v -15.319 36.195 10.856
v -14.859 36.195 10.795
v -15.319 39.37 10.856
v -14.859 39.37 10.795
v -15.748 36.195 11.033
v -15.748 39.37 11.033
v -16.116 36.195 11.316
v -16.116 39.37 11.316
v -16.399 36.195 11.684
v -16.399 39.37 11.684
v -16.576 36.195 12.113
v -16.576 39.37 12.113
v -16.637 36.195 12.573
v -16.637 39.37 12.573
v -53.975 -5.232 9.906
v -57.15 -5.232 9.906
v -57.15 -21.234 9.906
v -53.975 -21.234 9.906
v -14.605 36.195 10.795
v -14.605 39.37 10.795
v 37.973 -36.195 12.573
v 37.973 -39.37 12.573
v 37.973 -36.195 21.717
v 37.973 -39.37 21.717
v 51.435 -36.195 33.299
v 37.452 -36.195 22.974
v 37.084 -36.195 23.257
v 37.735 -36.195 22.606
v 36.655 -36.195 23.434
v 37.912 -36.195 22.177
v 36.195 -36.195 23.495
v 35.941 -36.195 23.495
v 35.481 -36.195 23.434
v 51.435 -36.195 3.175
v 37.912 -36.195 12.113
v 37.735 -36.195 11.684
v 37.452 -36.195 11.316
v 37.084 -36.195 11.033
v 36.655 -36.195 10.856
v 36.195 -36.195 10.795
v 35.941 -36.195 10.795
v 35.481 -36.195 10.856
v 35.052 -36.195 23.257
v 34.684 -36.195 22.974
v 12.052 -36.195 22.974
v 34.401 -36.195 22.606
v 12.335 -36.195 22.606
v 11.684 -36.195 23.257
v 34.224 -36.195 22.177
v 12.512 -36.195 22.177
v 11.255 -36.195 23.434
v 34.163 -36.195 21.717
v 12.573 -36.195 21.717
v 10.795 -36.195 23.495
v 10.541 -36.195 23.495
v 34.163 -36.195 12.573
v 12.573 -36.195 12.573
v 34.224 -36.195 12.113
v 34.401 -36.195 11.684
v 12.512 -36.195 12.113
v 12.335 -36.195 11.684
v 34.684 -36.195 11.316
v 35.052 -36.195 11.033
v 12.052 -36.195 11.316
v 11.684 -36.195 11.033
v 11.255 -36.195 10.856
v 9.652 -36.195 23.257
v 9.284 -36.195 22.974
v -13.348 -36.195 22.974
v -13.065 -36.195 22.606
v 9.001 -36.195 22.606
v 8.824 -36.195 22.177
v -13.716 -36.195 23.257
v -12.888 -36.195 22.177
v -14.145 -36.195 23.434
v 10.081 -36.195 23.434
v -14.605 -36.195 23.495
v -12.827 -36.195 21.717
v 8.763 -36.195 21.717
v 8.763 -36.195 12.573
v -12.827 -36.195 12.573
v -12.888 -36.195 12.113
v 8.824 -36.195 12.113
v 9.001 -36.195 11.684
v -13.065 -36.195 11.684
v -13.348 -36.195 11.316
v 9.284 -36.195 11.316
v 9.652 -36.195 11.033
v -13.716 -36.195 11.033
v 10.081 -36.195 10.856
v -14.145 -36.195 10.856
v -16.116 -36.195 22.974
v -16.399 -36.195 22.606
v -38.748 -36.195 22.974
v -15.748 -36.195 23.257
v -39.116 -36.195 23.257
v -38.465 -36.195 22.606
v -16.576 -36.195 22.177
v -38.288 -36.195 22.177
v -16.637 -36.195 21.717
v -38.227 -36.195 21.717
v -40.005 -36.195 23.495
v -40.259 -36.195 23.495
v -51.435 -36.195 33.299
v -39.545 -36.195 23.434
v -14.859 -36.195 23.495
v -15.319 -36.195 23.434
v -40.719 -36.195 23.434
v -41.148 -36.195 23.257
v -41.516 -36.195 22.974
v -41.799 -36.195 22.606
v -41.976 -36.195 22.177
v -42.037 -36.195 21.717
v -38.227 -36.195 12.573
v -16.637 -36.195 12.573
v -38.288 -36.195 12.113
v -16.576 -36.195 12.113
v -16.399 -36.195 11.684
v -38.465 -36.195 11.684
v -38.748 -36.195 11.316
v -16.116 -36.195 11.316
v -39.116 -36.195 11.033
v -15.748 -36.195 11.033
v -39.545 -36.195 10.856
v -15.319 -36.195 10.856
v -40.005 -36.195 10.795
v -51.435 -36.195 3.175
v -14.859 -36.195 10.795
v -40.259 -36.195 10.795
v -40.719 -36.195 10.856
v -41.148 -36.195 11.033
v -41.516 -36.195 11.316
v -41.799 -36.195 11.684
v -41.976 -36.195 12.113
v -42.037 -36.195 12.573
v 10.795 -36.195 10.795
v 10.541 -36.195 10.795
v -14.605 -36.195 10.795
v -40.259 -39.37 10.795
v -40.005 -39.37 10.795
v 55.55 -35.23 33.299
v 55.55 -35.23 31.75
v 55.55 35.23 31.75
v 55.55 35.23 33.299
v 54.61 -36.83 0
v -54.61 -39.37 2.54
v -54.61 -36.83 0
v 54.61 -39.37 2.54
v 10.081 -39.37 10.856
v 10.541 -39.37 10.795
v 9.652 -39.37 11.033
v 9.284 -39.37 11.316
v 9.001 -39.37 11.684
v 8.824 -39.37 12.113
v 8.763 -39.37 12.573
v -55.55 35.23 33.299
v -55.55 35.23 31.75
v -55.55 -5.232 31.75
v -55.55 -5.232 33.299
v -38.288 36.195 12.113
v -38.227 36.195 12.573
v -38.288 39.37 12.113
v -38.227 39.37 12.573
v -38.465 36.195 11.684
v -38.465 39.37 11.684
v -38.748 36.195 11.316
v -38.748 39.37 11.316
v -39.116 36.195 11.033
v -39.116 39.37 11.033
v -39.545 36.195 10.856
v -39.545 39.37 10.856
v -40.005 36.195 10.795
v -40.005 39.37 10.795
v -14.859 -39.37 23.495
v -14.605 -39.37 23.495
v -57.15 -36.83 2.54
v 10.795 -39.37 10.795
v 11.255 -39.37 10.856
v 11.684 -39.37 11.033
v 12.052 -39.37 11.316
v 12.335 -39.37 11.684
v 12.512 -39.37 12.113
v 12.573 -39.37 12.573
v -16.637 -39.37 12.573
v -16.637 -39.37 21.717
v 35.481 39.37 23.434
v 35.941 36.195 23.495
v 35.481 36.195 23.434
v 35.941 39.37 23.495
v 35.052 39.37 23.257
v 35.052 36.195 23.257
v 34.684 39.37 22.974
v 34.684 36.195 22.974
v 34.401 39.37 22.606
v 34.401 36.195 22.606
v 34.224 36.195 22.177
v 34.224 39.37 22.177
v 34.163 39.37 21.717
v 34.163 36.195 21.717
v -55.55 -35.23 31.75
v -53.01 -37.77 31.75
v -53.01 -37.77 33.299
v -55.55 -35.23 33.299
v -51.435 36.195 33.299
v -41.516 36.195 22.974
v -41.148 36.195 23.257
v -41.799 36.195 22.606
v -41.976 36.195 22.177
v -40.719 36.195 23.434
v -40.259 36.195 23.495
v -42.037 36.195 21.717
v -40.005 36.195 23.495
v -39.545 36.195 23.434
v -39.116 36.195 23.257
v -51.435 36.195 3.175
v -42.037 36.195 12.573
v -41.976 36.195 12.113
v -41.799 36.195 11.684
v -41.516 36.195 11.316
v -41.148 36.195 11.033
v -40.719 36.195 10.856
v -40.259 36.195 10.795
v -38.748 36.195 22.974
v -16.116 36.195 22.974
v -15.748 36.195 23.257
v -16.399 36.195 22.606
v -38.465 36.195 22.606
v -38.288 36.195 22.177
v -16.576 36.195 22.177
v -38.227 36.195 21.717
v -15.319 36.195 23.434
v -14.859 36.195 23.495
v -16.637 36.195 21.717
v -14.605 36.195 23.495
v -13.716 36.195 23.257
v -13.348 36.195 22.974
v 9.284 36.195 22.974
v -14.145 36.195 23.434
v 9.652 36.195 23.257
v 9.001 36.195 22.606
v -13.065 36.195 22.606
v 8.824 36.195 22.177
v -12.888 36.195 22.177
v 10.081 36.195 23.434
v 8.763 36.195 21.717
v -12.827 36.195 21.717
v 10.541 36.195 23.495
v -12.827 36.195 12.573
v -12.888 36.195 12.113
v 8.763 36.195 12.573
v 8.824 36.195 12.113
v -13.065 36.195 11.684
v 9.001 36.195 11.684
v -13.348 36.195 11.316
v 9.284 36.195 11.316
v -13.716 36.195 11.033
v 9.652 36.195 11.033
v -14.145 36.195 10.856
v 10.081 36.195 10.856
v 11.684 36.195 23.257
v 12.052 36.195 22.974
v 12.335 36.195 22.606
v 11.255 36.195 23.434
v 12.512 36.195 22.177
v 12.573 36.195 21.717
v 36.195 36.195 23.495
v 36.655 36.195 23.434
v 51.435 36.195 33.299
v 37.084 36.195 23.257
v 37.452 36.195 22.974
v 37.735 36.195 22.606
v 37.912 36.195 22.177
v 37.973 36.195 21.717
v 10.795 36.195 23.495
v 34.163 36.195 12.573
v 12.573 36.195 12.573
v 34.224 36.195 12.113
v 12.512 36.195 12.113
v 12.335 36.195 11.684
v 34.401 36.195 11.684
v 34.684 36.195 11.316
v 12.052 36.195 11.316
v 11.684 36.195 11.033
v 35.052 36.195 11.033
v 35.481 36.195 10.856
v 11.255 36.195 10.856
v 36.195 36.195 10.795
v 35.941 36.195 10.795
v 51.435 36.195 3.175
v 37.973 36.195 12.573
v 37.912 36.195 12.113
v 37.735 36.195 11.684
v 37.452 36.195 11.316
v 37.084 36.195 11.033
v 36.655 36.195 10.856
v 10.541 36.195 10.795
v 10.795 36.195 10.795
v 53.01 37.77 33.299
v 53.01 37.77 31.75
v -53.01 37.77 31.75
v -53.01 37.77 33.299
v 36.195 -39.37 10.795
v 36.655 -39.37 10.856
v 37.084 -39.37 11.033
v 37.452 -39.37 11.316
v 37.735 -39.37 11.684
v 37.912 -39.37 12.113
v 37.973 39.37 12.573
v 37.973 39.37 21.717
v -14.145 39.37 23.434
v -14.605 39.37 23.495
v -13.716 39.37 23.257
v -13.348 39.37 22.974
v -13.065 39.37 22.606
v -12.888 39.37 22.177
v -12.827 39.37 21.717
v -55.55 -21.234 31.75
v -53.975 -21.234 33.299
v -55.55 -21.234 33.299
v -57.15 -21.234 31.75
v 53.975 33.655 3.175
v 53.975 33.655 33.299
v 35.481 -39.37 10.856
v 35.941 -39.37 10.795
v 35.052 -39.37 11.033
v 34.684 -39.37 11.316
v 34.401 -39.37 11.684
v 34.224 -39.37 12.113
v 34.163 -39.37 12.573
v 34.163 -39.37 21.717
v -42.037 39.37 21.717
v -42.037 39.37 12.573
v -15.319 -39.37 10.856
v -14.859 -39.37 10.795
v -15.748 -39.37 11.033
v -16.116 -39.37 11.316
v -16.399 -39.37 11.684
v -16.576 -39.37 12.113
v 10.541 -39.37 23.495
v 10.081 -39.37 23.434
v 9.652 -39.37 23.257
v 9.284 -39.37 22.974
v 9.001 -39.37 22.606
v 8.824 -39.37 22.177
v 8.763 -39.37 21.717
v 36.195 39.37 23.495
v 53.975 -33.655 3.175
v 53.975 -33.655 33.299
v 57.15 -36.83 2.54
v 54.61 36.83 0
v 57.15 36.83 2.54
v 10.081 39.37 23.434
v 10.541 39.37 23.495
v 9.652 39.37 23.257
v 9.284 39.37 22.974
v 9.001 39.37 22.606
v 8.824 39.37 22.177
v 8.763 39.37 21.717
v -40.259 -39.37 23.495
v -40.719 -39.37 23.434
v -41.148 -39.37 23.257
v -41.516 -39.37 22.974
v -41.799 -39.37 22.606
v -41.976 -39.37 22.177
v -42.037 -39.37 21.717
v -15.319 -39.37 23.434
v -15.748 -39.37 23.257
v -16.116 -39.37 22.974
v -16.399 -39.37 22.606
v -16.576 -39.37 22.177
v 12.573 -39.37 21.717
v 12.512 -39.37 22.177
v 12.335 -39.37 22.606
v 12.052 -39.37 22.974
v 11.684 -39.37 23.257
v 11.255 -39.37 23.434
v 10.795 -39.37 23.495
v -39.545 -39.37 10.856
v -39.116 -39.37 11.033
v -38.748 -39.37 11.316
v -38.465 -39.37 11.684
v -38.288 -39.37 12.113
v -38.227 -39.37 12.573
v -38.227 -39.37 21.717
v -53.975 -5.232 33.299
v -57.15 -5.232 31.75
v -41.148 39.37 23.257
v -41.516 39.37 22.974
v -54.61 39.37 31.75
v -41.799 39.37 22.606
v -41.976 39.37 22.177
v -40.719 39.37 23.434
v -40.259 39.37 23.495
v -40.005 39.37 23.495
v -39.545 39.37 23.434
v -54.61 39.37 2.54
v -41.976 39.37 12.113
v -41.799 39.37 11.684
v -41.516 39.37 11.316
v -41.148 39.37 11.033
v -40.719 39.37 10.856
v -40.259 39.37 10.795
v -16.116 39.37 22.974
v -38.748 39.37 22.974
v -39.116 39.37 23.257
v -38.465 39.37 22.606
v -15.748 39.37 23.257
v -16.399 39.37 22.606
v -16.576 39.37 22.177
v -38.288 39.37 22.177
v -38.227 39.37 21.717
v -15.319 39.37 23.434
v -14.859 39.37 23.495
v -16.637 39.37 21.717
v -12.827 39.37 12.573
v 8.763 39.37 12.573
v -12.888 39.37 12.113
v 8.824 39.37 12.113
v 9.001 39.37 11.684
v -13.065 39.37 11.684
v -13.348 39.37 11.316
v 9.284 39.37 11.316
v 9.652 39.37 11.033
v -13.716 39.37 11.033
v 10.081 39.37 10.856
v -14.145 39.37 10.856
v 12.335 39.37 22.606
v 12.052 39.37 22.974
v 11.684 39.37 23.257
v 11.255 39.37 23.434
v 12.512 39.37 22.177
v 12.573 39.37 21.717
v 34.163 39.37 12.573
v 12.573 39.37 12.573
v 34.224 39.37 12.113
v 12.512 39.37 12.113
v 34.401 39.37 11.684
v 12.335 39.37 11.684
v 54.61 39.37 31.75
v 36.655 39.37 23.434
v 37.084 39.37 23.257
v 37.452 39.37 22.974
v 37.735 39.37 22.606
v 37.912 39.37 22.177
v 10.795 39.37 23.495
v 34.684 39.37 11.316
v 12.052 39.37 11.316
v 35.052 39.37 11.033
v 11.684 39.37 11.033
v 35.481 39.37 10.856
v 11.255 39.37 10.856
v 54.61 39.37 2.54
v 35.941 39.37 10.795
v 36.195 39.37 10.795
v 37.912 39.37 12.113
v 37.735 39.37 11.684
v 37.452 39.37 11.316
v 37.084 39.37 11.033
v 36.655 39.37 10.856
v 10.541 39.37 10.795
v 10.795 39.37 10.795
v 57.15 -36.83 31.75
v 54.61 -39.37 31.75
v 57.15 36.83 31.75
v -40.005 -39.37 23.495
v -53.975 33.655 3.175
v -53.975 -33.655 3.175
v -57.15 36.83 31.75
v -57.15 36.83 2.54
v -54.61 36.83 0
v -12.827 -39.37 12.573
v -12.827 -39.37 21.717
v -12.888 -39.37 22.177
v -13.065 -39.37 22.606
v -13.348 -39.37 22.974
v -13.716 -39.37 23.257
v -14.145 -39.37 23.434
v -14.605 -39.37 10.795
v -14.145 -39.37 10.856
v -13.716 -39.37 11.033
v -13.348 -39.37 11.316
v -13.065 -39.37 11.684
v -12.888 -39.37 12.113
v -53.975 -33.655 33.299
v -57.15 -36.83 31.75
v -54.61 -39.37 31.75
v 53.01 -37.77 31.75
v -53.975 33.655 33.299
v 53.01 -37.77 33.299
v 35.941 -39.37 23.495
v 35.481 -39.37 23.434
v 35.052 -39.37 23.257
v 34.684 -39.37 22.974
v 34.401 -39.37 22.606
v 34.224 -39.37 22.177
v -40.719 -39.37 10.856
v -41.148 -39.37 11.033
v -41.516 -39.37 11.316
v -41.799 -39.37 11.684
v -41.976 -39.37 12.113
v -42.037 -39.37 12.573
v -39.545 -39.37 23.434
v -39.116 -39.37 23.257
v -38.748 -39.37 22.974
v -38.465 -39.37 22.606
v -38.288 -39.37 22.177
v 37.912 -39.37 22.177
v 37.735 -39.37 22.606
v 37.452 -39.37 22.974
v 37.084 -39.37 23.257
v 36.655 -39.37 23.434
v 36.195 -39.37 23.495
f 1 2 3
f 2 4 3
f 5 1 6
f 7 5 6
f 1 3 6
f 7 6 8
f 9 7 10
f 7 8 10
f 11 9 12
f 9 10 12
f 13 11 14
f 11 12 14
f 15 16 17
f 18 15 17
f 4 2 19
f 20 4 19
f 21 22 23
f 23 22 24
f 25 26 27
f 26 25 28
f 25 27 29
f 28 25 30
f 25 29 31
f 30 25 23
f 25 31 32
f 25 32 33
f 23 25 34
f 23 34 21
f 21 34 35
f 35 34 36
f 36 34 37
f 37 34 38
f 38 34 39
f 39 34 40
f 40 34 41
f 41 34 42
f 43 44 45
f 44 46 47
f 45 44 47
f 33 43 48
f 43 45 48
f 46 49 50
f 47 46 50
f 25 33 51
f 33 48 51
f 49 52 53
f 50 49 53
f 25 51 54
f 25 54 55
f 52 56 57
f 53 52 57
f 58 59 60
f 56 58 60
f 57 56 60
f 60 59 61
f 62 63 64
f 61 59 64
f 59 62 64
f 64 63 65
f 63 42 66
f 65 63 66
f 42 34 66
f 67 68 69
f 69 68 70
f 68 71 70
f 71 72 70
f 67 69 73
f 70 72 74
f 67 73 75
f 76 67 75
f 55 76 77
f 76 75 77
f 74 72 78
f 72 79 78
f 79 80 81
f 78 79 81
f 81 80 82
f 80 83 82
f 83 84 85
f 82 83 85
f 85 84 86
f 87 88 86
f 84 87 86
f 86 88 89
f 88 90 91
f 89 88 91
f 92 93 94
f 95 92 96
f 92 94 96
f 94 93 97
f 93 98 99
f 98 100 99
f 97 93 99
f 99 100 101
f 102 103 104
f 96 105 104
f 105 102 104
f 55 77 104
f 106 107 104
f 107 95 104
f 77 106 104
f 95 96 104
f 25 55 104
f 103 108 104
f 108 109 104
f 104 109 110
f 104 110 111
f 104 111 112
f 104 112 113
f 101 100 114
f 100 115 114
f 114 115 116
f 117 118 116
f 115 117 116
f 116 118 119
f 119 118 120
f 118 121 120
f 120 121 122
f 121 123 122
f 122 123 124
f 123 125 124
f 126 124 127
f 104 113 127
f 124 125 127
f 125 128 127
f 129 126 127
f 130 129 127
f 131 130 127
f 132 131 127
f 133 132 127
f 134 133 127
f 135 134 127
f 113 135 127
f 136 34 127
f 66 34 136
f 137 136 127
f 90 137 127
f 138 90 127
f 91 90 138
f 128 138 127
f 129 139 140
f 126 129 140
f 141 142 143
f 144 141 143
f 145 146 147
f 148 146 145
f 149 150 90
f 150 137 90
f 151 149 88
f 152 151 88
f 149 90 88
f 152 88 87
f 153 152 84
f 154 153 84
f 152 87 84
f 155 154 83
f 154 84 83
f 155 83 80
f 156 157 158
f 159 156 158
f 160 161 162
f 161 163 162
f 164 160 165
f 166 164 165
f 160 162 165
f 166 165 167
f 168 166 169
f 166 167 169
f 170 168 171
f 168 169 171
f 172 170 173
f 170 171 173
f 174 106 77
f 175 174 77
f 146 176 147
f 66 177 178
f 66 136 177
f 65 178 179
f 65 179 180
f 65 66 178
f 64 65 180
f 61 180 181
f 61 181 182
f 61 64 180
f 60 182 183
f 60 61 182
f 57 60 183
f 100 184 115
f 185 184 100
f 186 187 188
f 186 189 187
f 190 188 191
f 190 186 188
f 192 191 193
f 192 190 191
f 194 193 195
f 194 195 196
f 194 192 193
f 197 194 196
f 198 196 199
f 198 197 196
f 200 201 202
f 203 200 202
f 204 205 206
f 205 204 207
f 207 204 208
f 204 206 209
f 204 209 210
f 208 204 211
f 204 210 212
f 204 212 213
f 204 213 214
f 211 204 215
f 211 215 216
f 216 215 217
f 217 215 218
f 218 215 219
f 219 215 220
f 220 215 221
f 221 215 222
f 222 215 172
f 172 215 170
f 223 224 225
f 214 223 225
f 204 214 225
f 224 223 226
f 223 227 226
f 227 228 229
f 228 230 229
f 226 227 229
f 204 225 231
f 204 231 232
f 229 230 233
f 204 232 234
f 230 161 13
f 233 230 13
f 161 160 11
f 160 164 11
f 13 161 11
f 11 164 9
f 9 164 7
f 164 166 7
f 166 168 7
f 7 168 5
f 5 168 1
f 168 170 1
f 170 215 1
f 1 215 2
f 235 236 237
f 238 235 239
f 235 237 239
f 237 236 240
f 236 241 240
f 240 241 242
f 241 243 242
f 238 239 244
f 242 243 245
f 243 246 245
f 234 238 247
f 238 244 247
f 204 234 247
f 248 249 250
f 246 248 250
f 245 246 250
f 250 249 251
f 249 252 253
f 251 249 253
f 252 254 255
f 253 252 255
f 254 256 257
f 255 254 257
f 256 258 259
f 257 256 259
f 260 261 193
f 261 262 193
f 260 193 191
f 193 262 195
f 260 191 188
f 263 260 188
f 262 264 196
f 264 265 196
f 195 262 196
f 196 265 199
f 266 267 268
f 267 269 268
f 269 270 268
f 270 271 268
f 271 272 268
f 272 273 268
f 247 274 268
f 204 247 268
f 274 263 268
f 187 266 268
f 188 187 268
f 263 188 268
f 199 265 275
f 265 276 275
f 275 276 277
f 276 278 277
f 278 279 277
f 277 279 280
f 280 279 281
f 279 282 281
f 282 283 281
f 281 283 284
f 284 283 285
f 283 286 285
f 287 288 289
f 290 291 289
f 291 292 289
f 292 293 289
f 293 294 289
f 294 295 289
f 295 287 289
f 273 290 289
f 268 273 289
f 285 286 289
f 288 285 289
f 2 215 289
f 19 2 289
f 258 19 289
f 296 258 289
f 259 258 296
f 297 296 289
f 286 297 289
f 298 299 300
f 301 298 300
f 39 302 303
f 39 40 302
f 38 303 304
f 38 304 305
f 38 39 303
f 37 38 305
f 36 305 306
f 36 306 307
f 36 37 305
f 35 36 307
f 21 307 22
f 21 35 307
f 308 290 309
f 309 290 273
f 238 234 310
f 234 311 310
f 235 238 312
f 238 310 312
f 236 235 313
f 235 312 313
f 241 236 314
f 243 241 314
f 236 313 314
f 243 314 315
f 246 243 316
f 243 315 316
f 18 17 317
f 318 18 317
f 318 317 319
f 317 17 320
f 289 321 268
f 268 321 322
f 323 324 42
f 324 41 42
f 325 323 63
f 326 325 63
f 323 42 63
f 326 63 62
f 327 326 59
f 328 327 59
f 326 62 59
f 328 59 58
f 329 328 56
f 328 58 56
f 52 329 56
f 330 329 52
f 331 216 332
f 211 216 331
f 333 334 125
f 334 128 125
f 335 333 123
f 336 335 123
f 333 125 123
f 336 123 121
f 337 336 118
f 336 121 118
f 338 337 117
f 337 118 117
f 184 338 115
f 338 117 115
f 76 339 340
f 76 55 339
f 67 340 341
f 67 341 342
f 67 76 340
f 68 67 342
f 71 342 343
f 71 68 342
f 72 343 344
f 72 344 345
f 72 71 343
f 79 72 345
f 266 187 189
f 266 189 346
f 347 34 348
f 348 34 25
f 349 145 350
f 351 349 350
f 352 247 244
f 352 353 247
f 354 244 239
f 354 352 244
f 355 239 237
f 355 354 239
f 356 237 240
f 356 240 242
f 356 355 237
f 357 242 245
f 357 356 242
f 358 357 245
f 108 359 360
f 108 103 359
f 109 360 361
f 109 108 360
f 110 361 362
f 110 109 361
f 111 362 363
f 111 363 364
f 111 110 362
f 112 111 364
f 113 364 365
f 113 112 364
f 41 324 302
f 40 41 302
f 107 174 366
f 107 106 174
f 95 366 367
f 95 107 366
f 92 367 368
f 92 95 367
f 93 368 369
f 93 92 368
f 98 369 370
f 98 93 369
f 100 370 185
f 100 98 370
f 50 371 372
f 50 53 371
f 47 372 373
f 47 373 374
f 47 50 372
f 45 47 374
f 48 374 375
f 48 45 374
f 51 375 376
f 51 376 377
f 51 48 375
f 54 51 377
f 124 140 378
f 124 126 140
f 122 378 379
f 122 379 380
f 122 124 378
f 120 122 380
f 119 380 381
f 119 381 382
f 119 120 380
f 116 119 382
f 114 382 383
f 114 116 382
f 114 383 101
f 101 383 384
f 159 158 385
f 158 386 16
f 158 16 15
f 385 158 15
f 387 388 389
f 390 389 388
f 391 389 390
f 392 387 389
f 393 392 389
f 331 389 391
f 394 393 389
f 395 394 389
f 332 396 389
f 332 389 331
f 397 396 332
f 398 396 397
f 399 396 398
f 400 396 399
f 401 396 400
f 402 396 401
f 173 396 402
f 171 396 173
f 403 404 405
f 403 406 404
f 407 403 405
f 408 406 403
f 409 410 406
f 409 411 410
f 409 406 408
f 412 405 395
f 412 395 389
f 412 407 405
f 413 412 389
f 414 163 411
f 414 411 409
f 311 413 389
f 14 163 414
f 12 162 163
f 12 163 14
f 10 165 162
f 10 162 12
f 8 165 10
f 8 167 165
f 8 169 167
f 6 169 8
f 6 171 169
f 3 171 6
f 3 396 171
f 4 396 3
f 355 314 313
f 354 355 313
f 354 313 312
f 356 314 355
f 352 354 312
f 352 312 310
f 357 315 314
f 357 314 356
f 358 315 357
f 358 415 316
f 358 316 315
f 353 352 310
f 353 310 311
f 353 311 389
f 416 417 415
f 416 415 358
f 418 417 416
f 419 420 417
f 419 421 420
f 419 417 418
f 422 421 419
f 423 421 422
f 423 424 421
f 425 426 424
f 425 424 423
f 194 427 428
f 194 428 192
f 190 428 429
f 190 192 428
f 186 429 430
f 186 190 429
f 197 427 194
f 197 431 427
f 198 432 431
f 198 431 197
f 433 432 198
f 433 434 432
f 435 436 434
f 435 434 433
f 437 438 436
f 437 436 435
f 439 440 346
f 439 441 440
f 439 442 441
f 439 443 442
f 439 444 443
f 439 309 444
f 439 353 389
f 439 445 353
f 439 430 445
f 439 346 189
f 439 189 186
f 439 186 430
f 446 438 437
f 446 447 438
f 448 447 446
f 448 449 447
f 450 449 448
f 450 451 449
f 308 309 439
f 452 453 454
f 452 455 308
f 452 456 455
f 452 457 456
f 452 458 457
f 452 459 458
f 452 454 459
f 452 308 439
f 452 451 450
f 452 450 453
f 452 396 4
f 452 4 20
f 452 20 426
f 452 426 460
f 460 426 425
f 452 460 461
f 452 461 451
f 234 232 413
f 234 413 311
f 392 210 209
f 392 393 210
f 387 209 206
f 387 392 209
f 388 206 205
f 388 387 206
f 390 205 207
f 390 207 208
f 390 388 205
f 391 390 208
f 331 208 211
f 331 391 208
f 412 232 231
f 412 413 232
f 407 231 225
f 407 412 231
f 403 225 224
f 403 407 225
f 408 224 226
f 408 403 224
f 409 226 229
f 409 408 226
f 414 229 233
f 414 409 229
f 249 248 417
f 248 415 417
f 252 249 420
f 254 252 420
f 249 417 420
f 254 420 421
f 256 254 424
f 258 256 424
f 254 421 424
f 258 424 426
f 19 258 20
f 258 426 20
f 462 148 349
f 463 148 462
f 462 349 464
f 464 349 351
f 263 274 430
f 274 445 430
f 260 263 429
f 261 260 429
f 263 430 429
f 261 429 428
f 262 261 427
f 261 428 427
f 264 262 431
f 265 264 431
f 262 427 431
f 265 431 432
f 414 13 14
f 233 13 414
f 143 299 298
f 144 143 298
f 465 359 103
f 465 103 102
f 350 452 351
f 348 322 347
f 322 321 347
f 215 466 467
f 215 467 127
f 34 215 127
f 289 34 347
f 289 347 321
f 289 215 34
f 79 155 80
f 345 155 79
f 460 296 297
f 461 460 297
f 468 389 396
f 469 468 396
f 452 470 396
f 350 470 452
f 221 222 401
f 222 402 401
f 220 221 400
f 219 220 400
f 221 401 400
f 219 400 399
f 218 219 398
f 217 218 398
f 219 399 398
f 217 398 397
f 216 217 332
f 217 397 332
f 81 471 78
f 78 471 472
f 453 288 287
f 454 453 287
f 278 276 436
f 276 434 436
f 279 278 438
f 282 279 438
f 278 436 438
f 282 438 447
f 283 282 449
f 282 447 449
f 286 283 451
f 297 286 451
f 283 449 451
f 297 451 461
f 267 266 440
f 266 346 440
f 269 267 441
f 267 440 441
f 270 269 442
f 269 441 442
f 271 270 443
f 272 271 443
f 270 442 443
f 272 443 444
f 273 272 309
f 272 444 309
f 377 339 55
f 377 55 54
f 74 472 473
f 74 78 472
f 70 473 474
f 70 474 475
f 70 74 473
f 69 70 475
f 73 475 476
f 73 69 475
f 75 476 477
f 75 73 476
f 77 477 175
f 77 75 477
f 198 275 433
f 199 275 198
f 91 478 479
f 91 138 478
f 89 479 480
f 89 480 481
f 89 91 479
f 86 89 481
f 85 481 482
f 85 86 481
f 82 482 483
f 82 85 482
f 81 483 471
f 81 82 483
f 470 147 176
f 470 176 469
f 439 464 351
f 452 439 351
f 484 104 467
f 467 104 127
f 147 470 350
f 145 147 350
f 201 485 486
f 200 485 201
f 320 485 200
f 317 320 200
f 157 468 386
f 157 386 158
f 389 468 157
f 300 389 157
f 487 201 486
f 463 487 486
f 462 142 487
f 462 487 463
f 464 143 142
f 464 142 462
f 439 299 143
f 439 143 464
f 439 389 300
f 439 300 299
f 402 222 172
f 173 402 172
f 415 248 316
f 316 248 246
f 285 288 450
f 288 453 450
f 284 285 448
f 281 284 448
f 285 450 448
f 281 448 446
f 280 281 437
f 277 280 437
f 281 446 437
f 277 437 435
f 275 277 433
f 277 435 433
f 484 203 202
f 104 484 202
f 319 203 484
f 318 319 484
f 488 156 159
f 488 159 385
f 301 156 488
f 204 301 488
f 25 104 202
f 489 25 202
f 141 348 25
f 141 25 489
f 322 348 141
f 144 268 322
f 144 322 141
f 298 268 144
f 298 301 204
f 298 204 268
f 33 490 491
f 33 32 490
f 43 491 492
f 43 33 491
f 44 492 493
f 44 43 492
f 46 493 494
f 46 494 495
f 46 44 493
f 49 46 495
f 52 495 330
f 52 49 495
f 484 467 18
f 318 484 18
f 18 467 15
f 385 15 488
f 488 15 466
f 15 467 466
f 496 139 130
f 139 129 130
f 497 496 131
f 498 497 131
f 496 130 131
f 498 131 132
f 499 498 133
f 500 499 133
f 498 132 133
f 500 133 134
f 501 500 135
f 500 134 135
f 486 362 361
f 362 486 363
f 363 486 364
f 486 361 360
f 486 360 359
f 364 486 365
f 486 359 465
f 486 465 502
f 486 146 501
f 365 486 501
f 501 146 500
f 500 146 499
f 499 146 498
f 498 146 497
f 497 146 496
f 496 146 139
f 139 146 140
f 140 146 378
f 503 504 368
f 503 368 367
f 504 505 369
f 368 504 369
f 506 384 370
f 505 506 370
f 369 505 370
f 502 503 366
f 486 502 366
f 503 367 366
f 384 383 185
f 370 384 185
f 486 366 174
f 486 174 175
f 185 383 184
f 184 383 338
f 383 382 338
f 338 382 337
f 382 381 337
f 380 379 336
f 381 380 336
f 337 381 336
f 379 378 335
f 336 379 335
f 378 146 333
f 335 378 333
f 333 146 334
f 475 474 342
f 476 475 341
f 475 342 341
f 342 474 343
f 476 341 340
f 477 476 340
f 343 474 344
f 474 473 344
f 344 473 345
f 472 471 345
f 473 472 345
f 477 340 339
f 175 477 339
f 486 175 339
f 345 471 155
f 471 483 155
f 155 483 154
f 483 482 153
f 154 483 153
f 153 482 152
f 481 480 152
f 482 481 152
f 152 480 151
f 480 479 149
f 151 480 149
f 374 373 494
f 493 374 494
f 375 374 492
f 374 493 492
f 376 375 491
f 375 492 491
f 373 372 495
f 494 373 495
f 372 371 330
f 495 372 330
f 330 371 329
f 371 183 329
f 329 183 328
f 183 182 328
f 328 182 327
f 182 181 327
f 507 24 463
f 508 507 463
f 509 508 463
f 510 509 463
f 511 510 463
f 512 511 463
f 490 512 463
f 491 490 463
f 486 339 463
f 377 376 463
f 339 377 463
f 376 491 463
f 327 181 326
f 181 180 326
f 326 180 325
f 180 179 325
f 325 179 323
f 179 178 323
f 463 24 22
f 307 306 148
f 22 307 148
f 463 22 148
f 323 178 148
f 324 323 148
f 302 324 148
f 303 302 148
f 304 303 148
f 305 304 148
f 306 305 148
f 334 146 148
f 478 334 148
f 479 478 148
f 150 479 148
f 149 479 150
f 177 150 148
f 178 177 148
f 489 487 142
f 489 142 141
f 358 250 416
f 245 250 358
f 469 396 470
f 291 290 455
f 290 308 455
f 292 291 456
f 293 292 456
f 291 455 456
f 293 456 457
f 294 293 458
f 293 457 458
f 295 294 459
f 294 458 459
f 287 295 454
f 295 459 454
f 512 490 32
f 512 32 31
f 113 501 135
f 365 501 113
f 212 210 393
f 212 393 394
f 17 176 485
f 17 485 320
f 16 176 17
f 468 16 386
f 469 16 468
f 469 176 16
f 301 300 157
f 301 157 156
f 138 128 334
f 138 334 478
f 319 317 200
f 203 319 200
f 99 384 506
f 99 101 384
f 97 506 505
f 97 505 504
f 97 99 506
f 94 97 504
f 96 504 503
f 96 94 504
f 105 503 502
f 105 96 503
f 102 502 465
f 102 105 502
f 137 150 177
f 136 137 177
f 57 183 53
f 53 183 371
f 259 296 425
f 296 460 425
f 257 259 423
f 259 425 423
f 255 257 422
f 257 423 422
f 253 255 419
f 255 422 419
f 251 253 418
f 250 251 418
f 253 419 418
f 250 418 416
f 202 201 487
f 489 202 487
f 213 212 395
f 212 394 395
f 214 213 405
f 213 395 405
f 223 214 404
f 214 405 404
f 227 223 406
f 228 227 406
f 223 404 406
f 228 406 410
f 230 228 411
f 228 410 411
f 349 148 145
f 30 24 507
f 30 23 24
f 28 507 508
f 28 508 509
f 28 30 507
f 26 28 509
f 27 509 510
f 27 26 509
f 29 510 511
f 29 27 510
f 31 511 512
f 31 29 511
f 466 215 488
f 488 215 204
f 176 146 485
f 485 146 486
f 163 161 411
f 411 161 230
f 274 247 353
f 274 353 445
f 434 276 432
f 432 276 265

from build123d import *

# Parameters (mm, degrees)
F0_W      = 114.3
F0_H      = 78.74
F1_DEPTH  = 3.175
F2_W      = 114.3
F2_H      = 78.74
F2_W_2    = 107.95
F2_H_2    = 72.39
F3_DEPTH  = 28.575
F4_W      = 16.002
F4_H      = 21.844
F5_DEPTH  = 3.175
F7_DEPTH  = 1.5494
F8_SIZE   = 2.54
F9_SIZE   = 2.54
F10_SIZE  = 2.54
F11_W     = 3.81
F11_H     = 12.7
F12_DEPTH = 78.741
F13_R     = 1.778


with BuildPart() as f1:
    # F0 (on Top) → F1 (new body)
    with BuildSketch(Plane.XY):
        Rectangle(F0_W, F0_H)
    extrude(amount=F1_DEPTH)

    # F2 (on face) → F3 (join)
    with BuildSketch(Plane.XY.offset(3.175)):
        Rectangle(F2_W, F2_H)
        Rectangle(F2_W_2, F2_H_2, mode=Mode.SUBTRACT)
    extrude(amount=F3_DEPTH)

    # F4 (on face) → F5 (cut, through all)
    with BuildSketch(Plane(origin=(-57.15, 0, 0), x_dir=(0, -1, 0), z_dir=(-1, 0, 0))):
        with Locations((13.2334, 20.828)):
            Rectangle(F4_W, F4_H)
    extrude(amount=-F5_DEPTH, mode=Mode.SUBTRACT)

    # F6 (on face) → F7 (join)
    with BuildSketch(Plane.XY.offset(31.75)):
        Polygon((55.5498, 37.7698), (-55.5498, 37.7698), (-55.5498, -5.2324), (-53.975, -5.2324), (-53.975, 36.195), (53.975, 36.195), (53.975, -36.195), (-53.975, -36.195), (-53.975, -21.2344), (-55.5498, -21.2344), (-55.5498, -37.7698), (55.5498, -37.7698), align=None)
    extrude(amount=F7_DEPTH)

    # F8
    f8_edges = [f1.edges().sort_by_distance(p)[0] for p in [
        (57.15, 39.37, 15.875),
        (57.15, -39.37, 15.875),
        (-57.15, -39.37, 15.875),
        (-57.15, 39.37, 15.875),
        (0, 39.37, 0),
        (-57.15, 0, 0),
        (0, -39.37, 0),
        (57.15, 0, 0),
    ]]
    chamfer(f8_edges, length=F8_SIZE)

    # F9
    f9_edges = [f1.edges().sort_by_distance(p)[0] for p in [
        (-53.975, 36.195, 18.2372),
        (53.975, 36.195, 18.2372),
        (53.975, -36.195, 18.2372),
        (-53.975, -36.195, 18.2372),
    ]]
    chamfer(f9_edges, length=F9_SIZE)

    # F10
    f10_edges = [f1.edges().sort_by_distance(p)[0] for p in [
        (55.5498, 37.7698, 32.5247),
        (-55.5498, 37.7698, 32.5247),
        (-55.5498, -37.7698, 32.5247),
        (55.5498, -37.7698, 32.5247),
    ]]
    chamfer(f10_edges, length=F10_SIZE)

    # F11 (on face) → F12 (cut, through all)
    with BuildSketch(Plane.XZ.offset(39.37)):
        with Locations((-40.132, 17.145)):
            Rectangle(F11_W, F11_H)
        with Locations((-14.732, 17.145)):
            Rectangle(F11_W, F11_H)
        with Locations((10.668, 17.145)):
            Rectangle(F11_W, F11_H)
        with Locations((36.068, 17.145)):
            Rectangle(F11_W, F11_H)
    extrude(amount=-F12_DEPTH, mode=Mode.SUBTRACT)

    # F13
    f13_edges = [f1.edges().sort_by_distance(p)[0] for p in [
        (-42.037, -37.7825, 23.495),
        (-16.637, -37.7825, 23.495),
        (8.763, -37.7825, 23.495),
        (34.163, -37.7825, 23.495),
        (-38.227, -37.7825, 23.495),
        (-12.827, -37.7825, 23.495),
        (12.573, -37.7825, 23.495),
        (37.973, -37.7825, 23.495),
        (-42.037, -37.7825, 10.795),
        (-16.637, -37.7825, 10.795),
        (8.763, -37.7825, 10.795),
        (34.163, -37.7825, 10.795),
        (-38.227, -37.7825, 10.795),
        (-12.827, -37.7825, 10.795),
        (12.573, -37.7825, 10.795),
        (37.973, -37.7825, 10.795),
        (37.973, 37.7825, 23.495),
        (12.573, 37.7825, 23.495),
        (-12.827, 37.7825, 23.495),
        (-38.227, 37.7825, 23.495),
        (34.163, 37.7825, 23.495),
        (8.763, 37.7825, 23.495),
        (-16.637, 37.7825, 23.495),
        (-42.037, 37.7825, 23.495),
        (34.163, 37.7825, 10.795),
        (8.763, 37.7825, 10.795),
        (-16.637, 37.7825, 10.795),
        (-42.037, 37.7825, 10.795),
        (-38.227, 37.7825, 10.795),
        (-12.827, 37.7825, 10.795),
        (12.573, 37.7825, 10.795),
        (37.973, 37.7825, 10.795),
    ]]
    fillet(f13_edges, radius=F13_R)


solid = f1.part
